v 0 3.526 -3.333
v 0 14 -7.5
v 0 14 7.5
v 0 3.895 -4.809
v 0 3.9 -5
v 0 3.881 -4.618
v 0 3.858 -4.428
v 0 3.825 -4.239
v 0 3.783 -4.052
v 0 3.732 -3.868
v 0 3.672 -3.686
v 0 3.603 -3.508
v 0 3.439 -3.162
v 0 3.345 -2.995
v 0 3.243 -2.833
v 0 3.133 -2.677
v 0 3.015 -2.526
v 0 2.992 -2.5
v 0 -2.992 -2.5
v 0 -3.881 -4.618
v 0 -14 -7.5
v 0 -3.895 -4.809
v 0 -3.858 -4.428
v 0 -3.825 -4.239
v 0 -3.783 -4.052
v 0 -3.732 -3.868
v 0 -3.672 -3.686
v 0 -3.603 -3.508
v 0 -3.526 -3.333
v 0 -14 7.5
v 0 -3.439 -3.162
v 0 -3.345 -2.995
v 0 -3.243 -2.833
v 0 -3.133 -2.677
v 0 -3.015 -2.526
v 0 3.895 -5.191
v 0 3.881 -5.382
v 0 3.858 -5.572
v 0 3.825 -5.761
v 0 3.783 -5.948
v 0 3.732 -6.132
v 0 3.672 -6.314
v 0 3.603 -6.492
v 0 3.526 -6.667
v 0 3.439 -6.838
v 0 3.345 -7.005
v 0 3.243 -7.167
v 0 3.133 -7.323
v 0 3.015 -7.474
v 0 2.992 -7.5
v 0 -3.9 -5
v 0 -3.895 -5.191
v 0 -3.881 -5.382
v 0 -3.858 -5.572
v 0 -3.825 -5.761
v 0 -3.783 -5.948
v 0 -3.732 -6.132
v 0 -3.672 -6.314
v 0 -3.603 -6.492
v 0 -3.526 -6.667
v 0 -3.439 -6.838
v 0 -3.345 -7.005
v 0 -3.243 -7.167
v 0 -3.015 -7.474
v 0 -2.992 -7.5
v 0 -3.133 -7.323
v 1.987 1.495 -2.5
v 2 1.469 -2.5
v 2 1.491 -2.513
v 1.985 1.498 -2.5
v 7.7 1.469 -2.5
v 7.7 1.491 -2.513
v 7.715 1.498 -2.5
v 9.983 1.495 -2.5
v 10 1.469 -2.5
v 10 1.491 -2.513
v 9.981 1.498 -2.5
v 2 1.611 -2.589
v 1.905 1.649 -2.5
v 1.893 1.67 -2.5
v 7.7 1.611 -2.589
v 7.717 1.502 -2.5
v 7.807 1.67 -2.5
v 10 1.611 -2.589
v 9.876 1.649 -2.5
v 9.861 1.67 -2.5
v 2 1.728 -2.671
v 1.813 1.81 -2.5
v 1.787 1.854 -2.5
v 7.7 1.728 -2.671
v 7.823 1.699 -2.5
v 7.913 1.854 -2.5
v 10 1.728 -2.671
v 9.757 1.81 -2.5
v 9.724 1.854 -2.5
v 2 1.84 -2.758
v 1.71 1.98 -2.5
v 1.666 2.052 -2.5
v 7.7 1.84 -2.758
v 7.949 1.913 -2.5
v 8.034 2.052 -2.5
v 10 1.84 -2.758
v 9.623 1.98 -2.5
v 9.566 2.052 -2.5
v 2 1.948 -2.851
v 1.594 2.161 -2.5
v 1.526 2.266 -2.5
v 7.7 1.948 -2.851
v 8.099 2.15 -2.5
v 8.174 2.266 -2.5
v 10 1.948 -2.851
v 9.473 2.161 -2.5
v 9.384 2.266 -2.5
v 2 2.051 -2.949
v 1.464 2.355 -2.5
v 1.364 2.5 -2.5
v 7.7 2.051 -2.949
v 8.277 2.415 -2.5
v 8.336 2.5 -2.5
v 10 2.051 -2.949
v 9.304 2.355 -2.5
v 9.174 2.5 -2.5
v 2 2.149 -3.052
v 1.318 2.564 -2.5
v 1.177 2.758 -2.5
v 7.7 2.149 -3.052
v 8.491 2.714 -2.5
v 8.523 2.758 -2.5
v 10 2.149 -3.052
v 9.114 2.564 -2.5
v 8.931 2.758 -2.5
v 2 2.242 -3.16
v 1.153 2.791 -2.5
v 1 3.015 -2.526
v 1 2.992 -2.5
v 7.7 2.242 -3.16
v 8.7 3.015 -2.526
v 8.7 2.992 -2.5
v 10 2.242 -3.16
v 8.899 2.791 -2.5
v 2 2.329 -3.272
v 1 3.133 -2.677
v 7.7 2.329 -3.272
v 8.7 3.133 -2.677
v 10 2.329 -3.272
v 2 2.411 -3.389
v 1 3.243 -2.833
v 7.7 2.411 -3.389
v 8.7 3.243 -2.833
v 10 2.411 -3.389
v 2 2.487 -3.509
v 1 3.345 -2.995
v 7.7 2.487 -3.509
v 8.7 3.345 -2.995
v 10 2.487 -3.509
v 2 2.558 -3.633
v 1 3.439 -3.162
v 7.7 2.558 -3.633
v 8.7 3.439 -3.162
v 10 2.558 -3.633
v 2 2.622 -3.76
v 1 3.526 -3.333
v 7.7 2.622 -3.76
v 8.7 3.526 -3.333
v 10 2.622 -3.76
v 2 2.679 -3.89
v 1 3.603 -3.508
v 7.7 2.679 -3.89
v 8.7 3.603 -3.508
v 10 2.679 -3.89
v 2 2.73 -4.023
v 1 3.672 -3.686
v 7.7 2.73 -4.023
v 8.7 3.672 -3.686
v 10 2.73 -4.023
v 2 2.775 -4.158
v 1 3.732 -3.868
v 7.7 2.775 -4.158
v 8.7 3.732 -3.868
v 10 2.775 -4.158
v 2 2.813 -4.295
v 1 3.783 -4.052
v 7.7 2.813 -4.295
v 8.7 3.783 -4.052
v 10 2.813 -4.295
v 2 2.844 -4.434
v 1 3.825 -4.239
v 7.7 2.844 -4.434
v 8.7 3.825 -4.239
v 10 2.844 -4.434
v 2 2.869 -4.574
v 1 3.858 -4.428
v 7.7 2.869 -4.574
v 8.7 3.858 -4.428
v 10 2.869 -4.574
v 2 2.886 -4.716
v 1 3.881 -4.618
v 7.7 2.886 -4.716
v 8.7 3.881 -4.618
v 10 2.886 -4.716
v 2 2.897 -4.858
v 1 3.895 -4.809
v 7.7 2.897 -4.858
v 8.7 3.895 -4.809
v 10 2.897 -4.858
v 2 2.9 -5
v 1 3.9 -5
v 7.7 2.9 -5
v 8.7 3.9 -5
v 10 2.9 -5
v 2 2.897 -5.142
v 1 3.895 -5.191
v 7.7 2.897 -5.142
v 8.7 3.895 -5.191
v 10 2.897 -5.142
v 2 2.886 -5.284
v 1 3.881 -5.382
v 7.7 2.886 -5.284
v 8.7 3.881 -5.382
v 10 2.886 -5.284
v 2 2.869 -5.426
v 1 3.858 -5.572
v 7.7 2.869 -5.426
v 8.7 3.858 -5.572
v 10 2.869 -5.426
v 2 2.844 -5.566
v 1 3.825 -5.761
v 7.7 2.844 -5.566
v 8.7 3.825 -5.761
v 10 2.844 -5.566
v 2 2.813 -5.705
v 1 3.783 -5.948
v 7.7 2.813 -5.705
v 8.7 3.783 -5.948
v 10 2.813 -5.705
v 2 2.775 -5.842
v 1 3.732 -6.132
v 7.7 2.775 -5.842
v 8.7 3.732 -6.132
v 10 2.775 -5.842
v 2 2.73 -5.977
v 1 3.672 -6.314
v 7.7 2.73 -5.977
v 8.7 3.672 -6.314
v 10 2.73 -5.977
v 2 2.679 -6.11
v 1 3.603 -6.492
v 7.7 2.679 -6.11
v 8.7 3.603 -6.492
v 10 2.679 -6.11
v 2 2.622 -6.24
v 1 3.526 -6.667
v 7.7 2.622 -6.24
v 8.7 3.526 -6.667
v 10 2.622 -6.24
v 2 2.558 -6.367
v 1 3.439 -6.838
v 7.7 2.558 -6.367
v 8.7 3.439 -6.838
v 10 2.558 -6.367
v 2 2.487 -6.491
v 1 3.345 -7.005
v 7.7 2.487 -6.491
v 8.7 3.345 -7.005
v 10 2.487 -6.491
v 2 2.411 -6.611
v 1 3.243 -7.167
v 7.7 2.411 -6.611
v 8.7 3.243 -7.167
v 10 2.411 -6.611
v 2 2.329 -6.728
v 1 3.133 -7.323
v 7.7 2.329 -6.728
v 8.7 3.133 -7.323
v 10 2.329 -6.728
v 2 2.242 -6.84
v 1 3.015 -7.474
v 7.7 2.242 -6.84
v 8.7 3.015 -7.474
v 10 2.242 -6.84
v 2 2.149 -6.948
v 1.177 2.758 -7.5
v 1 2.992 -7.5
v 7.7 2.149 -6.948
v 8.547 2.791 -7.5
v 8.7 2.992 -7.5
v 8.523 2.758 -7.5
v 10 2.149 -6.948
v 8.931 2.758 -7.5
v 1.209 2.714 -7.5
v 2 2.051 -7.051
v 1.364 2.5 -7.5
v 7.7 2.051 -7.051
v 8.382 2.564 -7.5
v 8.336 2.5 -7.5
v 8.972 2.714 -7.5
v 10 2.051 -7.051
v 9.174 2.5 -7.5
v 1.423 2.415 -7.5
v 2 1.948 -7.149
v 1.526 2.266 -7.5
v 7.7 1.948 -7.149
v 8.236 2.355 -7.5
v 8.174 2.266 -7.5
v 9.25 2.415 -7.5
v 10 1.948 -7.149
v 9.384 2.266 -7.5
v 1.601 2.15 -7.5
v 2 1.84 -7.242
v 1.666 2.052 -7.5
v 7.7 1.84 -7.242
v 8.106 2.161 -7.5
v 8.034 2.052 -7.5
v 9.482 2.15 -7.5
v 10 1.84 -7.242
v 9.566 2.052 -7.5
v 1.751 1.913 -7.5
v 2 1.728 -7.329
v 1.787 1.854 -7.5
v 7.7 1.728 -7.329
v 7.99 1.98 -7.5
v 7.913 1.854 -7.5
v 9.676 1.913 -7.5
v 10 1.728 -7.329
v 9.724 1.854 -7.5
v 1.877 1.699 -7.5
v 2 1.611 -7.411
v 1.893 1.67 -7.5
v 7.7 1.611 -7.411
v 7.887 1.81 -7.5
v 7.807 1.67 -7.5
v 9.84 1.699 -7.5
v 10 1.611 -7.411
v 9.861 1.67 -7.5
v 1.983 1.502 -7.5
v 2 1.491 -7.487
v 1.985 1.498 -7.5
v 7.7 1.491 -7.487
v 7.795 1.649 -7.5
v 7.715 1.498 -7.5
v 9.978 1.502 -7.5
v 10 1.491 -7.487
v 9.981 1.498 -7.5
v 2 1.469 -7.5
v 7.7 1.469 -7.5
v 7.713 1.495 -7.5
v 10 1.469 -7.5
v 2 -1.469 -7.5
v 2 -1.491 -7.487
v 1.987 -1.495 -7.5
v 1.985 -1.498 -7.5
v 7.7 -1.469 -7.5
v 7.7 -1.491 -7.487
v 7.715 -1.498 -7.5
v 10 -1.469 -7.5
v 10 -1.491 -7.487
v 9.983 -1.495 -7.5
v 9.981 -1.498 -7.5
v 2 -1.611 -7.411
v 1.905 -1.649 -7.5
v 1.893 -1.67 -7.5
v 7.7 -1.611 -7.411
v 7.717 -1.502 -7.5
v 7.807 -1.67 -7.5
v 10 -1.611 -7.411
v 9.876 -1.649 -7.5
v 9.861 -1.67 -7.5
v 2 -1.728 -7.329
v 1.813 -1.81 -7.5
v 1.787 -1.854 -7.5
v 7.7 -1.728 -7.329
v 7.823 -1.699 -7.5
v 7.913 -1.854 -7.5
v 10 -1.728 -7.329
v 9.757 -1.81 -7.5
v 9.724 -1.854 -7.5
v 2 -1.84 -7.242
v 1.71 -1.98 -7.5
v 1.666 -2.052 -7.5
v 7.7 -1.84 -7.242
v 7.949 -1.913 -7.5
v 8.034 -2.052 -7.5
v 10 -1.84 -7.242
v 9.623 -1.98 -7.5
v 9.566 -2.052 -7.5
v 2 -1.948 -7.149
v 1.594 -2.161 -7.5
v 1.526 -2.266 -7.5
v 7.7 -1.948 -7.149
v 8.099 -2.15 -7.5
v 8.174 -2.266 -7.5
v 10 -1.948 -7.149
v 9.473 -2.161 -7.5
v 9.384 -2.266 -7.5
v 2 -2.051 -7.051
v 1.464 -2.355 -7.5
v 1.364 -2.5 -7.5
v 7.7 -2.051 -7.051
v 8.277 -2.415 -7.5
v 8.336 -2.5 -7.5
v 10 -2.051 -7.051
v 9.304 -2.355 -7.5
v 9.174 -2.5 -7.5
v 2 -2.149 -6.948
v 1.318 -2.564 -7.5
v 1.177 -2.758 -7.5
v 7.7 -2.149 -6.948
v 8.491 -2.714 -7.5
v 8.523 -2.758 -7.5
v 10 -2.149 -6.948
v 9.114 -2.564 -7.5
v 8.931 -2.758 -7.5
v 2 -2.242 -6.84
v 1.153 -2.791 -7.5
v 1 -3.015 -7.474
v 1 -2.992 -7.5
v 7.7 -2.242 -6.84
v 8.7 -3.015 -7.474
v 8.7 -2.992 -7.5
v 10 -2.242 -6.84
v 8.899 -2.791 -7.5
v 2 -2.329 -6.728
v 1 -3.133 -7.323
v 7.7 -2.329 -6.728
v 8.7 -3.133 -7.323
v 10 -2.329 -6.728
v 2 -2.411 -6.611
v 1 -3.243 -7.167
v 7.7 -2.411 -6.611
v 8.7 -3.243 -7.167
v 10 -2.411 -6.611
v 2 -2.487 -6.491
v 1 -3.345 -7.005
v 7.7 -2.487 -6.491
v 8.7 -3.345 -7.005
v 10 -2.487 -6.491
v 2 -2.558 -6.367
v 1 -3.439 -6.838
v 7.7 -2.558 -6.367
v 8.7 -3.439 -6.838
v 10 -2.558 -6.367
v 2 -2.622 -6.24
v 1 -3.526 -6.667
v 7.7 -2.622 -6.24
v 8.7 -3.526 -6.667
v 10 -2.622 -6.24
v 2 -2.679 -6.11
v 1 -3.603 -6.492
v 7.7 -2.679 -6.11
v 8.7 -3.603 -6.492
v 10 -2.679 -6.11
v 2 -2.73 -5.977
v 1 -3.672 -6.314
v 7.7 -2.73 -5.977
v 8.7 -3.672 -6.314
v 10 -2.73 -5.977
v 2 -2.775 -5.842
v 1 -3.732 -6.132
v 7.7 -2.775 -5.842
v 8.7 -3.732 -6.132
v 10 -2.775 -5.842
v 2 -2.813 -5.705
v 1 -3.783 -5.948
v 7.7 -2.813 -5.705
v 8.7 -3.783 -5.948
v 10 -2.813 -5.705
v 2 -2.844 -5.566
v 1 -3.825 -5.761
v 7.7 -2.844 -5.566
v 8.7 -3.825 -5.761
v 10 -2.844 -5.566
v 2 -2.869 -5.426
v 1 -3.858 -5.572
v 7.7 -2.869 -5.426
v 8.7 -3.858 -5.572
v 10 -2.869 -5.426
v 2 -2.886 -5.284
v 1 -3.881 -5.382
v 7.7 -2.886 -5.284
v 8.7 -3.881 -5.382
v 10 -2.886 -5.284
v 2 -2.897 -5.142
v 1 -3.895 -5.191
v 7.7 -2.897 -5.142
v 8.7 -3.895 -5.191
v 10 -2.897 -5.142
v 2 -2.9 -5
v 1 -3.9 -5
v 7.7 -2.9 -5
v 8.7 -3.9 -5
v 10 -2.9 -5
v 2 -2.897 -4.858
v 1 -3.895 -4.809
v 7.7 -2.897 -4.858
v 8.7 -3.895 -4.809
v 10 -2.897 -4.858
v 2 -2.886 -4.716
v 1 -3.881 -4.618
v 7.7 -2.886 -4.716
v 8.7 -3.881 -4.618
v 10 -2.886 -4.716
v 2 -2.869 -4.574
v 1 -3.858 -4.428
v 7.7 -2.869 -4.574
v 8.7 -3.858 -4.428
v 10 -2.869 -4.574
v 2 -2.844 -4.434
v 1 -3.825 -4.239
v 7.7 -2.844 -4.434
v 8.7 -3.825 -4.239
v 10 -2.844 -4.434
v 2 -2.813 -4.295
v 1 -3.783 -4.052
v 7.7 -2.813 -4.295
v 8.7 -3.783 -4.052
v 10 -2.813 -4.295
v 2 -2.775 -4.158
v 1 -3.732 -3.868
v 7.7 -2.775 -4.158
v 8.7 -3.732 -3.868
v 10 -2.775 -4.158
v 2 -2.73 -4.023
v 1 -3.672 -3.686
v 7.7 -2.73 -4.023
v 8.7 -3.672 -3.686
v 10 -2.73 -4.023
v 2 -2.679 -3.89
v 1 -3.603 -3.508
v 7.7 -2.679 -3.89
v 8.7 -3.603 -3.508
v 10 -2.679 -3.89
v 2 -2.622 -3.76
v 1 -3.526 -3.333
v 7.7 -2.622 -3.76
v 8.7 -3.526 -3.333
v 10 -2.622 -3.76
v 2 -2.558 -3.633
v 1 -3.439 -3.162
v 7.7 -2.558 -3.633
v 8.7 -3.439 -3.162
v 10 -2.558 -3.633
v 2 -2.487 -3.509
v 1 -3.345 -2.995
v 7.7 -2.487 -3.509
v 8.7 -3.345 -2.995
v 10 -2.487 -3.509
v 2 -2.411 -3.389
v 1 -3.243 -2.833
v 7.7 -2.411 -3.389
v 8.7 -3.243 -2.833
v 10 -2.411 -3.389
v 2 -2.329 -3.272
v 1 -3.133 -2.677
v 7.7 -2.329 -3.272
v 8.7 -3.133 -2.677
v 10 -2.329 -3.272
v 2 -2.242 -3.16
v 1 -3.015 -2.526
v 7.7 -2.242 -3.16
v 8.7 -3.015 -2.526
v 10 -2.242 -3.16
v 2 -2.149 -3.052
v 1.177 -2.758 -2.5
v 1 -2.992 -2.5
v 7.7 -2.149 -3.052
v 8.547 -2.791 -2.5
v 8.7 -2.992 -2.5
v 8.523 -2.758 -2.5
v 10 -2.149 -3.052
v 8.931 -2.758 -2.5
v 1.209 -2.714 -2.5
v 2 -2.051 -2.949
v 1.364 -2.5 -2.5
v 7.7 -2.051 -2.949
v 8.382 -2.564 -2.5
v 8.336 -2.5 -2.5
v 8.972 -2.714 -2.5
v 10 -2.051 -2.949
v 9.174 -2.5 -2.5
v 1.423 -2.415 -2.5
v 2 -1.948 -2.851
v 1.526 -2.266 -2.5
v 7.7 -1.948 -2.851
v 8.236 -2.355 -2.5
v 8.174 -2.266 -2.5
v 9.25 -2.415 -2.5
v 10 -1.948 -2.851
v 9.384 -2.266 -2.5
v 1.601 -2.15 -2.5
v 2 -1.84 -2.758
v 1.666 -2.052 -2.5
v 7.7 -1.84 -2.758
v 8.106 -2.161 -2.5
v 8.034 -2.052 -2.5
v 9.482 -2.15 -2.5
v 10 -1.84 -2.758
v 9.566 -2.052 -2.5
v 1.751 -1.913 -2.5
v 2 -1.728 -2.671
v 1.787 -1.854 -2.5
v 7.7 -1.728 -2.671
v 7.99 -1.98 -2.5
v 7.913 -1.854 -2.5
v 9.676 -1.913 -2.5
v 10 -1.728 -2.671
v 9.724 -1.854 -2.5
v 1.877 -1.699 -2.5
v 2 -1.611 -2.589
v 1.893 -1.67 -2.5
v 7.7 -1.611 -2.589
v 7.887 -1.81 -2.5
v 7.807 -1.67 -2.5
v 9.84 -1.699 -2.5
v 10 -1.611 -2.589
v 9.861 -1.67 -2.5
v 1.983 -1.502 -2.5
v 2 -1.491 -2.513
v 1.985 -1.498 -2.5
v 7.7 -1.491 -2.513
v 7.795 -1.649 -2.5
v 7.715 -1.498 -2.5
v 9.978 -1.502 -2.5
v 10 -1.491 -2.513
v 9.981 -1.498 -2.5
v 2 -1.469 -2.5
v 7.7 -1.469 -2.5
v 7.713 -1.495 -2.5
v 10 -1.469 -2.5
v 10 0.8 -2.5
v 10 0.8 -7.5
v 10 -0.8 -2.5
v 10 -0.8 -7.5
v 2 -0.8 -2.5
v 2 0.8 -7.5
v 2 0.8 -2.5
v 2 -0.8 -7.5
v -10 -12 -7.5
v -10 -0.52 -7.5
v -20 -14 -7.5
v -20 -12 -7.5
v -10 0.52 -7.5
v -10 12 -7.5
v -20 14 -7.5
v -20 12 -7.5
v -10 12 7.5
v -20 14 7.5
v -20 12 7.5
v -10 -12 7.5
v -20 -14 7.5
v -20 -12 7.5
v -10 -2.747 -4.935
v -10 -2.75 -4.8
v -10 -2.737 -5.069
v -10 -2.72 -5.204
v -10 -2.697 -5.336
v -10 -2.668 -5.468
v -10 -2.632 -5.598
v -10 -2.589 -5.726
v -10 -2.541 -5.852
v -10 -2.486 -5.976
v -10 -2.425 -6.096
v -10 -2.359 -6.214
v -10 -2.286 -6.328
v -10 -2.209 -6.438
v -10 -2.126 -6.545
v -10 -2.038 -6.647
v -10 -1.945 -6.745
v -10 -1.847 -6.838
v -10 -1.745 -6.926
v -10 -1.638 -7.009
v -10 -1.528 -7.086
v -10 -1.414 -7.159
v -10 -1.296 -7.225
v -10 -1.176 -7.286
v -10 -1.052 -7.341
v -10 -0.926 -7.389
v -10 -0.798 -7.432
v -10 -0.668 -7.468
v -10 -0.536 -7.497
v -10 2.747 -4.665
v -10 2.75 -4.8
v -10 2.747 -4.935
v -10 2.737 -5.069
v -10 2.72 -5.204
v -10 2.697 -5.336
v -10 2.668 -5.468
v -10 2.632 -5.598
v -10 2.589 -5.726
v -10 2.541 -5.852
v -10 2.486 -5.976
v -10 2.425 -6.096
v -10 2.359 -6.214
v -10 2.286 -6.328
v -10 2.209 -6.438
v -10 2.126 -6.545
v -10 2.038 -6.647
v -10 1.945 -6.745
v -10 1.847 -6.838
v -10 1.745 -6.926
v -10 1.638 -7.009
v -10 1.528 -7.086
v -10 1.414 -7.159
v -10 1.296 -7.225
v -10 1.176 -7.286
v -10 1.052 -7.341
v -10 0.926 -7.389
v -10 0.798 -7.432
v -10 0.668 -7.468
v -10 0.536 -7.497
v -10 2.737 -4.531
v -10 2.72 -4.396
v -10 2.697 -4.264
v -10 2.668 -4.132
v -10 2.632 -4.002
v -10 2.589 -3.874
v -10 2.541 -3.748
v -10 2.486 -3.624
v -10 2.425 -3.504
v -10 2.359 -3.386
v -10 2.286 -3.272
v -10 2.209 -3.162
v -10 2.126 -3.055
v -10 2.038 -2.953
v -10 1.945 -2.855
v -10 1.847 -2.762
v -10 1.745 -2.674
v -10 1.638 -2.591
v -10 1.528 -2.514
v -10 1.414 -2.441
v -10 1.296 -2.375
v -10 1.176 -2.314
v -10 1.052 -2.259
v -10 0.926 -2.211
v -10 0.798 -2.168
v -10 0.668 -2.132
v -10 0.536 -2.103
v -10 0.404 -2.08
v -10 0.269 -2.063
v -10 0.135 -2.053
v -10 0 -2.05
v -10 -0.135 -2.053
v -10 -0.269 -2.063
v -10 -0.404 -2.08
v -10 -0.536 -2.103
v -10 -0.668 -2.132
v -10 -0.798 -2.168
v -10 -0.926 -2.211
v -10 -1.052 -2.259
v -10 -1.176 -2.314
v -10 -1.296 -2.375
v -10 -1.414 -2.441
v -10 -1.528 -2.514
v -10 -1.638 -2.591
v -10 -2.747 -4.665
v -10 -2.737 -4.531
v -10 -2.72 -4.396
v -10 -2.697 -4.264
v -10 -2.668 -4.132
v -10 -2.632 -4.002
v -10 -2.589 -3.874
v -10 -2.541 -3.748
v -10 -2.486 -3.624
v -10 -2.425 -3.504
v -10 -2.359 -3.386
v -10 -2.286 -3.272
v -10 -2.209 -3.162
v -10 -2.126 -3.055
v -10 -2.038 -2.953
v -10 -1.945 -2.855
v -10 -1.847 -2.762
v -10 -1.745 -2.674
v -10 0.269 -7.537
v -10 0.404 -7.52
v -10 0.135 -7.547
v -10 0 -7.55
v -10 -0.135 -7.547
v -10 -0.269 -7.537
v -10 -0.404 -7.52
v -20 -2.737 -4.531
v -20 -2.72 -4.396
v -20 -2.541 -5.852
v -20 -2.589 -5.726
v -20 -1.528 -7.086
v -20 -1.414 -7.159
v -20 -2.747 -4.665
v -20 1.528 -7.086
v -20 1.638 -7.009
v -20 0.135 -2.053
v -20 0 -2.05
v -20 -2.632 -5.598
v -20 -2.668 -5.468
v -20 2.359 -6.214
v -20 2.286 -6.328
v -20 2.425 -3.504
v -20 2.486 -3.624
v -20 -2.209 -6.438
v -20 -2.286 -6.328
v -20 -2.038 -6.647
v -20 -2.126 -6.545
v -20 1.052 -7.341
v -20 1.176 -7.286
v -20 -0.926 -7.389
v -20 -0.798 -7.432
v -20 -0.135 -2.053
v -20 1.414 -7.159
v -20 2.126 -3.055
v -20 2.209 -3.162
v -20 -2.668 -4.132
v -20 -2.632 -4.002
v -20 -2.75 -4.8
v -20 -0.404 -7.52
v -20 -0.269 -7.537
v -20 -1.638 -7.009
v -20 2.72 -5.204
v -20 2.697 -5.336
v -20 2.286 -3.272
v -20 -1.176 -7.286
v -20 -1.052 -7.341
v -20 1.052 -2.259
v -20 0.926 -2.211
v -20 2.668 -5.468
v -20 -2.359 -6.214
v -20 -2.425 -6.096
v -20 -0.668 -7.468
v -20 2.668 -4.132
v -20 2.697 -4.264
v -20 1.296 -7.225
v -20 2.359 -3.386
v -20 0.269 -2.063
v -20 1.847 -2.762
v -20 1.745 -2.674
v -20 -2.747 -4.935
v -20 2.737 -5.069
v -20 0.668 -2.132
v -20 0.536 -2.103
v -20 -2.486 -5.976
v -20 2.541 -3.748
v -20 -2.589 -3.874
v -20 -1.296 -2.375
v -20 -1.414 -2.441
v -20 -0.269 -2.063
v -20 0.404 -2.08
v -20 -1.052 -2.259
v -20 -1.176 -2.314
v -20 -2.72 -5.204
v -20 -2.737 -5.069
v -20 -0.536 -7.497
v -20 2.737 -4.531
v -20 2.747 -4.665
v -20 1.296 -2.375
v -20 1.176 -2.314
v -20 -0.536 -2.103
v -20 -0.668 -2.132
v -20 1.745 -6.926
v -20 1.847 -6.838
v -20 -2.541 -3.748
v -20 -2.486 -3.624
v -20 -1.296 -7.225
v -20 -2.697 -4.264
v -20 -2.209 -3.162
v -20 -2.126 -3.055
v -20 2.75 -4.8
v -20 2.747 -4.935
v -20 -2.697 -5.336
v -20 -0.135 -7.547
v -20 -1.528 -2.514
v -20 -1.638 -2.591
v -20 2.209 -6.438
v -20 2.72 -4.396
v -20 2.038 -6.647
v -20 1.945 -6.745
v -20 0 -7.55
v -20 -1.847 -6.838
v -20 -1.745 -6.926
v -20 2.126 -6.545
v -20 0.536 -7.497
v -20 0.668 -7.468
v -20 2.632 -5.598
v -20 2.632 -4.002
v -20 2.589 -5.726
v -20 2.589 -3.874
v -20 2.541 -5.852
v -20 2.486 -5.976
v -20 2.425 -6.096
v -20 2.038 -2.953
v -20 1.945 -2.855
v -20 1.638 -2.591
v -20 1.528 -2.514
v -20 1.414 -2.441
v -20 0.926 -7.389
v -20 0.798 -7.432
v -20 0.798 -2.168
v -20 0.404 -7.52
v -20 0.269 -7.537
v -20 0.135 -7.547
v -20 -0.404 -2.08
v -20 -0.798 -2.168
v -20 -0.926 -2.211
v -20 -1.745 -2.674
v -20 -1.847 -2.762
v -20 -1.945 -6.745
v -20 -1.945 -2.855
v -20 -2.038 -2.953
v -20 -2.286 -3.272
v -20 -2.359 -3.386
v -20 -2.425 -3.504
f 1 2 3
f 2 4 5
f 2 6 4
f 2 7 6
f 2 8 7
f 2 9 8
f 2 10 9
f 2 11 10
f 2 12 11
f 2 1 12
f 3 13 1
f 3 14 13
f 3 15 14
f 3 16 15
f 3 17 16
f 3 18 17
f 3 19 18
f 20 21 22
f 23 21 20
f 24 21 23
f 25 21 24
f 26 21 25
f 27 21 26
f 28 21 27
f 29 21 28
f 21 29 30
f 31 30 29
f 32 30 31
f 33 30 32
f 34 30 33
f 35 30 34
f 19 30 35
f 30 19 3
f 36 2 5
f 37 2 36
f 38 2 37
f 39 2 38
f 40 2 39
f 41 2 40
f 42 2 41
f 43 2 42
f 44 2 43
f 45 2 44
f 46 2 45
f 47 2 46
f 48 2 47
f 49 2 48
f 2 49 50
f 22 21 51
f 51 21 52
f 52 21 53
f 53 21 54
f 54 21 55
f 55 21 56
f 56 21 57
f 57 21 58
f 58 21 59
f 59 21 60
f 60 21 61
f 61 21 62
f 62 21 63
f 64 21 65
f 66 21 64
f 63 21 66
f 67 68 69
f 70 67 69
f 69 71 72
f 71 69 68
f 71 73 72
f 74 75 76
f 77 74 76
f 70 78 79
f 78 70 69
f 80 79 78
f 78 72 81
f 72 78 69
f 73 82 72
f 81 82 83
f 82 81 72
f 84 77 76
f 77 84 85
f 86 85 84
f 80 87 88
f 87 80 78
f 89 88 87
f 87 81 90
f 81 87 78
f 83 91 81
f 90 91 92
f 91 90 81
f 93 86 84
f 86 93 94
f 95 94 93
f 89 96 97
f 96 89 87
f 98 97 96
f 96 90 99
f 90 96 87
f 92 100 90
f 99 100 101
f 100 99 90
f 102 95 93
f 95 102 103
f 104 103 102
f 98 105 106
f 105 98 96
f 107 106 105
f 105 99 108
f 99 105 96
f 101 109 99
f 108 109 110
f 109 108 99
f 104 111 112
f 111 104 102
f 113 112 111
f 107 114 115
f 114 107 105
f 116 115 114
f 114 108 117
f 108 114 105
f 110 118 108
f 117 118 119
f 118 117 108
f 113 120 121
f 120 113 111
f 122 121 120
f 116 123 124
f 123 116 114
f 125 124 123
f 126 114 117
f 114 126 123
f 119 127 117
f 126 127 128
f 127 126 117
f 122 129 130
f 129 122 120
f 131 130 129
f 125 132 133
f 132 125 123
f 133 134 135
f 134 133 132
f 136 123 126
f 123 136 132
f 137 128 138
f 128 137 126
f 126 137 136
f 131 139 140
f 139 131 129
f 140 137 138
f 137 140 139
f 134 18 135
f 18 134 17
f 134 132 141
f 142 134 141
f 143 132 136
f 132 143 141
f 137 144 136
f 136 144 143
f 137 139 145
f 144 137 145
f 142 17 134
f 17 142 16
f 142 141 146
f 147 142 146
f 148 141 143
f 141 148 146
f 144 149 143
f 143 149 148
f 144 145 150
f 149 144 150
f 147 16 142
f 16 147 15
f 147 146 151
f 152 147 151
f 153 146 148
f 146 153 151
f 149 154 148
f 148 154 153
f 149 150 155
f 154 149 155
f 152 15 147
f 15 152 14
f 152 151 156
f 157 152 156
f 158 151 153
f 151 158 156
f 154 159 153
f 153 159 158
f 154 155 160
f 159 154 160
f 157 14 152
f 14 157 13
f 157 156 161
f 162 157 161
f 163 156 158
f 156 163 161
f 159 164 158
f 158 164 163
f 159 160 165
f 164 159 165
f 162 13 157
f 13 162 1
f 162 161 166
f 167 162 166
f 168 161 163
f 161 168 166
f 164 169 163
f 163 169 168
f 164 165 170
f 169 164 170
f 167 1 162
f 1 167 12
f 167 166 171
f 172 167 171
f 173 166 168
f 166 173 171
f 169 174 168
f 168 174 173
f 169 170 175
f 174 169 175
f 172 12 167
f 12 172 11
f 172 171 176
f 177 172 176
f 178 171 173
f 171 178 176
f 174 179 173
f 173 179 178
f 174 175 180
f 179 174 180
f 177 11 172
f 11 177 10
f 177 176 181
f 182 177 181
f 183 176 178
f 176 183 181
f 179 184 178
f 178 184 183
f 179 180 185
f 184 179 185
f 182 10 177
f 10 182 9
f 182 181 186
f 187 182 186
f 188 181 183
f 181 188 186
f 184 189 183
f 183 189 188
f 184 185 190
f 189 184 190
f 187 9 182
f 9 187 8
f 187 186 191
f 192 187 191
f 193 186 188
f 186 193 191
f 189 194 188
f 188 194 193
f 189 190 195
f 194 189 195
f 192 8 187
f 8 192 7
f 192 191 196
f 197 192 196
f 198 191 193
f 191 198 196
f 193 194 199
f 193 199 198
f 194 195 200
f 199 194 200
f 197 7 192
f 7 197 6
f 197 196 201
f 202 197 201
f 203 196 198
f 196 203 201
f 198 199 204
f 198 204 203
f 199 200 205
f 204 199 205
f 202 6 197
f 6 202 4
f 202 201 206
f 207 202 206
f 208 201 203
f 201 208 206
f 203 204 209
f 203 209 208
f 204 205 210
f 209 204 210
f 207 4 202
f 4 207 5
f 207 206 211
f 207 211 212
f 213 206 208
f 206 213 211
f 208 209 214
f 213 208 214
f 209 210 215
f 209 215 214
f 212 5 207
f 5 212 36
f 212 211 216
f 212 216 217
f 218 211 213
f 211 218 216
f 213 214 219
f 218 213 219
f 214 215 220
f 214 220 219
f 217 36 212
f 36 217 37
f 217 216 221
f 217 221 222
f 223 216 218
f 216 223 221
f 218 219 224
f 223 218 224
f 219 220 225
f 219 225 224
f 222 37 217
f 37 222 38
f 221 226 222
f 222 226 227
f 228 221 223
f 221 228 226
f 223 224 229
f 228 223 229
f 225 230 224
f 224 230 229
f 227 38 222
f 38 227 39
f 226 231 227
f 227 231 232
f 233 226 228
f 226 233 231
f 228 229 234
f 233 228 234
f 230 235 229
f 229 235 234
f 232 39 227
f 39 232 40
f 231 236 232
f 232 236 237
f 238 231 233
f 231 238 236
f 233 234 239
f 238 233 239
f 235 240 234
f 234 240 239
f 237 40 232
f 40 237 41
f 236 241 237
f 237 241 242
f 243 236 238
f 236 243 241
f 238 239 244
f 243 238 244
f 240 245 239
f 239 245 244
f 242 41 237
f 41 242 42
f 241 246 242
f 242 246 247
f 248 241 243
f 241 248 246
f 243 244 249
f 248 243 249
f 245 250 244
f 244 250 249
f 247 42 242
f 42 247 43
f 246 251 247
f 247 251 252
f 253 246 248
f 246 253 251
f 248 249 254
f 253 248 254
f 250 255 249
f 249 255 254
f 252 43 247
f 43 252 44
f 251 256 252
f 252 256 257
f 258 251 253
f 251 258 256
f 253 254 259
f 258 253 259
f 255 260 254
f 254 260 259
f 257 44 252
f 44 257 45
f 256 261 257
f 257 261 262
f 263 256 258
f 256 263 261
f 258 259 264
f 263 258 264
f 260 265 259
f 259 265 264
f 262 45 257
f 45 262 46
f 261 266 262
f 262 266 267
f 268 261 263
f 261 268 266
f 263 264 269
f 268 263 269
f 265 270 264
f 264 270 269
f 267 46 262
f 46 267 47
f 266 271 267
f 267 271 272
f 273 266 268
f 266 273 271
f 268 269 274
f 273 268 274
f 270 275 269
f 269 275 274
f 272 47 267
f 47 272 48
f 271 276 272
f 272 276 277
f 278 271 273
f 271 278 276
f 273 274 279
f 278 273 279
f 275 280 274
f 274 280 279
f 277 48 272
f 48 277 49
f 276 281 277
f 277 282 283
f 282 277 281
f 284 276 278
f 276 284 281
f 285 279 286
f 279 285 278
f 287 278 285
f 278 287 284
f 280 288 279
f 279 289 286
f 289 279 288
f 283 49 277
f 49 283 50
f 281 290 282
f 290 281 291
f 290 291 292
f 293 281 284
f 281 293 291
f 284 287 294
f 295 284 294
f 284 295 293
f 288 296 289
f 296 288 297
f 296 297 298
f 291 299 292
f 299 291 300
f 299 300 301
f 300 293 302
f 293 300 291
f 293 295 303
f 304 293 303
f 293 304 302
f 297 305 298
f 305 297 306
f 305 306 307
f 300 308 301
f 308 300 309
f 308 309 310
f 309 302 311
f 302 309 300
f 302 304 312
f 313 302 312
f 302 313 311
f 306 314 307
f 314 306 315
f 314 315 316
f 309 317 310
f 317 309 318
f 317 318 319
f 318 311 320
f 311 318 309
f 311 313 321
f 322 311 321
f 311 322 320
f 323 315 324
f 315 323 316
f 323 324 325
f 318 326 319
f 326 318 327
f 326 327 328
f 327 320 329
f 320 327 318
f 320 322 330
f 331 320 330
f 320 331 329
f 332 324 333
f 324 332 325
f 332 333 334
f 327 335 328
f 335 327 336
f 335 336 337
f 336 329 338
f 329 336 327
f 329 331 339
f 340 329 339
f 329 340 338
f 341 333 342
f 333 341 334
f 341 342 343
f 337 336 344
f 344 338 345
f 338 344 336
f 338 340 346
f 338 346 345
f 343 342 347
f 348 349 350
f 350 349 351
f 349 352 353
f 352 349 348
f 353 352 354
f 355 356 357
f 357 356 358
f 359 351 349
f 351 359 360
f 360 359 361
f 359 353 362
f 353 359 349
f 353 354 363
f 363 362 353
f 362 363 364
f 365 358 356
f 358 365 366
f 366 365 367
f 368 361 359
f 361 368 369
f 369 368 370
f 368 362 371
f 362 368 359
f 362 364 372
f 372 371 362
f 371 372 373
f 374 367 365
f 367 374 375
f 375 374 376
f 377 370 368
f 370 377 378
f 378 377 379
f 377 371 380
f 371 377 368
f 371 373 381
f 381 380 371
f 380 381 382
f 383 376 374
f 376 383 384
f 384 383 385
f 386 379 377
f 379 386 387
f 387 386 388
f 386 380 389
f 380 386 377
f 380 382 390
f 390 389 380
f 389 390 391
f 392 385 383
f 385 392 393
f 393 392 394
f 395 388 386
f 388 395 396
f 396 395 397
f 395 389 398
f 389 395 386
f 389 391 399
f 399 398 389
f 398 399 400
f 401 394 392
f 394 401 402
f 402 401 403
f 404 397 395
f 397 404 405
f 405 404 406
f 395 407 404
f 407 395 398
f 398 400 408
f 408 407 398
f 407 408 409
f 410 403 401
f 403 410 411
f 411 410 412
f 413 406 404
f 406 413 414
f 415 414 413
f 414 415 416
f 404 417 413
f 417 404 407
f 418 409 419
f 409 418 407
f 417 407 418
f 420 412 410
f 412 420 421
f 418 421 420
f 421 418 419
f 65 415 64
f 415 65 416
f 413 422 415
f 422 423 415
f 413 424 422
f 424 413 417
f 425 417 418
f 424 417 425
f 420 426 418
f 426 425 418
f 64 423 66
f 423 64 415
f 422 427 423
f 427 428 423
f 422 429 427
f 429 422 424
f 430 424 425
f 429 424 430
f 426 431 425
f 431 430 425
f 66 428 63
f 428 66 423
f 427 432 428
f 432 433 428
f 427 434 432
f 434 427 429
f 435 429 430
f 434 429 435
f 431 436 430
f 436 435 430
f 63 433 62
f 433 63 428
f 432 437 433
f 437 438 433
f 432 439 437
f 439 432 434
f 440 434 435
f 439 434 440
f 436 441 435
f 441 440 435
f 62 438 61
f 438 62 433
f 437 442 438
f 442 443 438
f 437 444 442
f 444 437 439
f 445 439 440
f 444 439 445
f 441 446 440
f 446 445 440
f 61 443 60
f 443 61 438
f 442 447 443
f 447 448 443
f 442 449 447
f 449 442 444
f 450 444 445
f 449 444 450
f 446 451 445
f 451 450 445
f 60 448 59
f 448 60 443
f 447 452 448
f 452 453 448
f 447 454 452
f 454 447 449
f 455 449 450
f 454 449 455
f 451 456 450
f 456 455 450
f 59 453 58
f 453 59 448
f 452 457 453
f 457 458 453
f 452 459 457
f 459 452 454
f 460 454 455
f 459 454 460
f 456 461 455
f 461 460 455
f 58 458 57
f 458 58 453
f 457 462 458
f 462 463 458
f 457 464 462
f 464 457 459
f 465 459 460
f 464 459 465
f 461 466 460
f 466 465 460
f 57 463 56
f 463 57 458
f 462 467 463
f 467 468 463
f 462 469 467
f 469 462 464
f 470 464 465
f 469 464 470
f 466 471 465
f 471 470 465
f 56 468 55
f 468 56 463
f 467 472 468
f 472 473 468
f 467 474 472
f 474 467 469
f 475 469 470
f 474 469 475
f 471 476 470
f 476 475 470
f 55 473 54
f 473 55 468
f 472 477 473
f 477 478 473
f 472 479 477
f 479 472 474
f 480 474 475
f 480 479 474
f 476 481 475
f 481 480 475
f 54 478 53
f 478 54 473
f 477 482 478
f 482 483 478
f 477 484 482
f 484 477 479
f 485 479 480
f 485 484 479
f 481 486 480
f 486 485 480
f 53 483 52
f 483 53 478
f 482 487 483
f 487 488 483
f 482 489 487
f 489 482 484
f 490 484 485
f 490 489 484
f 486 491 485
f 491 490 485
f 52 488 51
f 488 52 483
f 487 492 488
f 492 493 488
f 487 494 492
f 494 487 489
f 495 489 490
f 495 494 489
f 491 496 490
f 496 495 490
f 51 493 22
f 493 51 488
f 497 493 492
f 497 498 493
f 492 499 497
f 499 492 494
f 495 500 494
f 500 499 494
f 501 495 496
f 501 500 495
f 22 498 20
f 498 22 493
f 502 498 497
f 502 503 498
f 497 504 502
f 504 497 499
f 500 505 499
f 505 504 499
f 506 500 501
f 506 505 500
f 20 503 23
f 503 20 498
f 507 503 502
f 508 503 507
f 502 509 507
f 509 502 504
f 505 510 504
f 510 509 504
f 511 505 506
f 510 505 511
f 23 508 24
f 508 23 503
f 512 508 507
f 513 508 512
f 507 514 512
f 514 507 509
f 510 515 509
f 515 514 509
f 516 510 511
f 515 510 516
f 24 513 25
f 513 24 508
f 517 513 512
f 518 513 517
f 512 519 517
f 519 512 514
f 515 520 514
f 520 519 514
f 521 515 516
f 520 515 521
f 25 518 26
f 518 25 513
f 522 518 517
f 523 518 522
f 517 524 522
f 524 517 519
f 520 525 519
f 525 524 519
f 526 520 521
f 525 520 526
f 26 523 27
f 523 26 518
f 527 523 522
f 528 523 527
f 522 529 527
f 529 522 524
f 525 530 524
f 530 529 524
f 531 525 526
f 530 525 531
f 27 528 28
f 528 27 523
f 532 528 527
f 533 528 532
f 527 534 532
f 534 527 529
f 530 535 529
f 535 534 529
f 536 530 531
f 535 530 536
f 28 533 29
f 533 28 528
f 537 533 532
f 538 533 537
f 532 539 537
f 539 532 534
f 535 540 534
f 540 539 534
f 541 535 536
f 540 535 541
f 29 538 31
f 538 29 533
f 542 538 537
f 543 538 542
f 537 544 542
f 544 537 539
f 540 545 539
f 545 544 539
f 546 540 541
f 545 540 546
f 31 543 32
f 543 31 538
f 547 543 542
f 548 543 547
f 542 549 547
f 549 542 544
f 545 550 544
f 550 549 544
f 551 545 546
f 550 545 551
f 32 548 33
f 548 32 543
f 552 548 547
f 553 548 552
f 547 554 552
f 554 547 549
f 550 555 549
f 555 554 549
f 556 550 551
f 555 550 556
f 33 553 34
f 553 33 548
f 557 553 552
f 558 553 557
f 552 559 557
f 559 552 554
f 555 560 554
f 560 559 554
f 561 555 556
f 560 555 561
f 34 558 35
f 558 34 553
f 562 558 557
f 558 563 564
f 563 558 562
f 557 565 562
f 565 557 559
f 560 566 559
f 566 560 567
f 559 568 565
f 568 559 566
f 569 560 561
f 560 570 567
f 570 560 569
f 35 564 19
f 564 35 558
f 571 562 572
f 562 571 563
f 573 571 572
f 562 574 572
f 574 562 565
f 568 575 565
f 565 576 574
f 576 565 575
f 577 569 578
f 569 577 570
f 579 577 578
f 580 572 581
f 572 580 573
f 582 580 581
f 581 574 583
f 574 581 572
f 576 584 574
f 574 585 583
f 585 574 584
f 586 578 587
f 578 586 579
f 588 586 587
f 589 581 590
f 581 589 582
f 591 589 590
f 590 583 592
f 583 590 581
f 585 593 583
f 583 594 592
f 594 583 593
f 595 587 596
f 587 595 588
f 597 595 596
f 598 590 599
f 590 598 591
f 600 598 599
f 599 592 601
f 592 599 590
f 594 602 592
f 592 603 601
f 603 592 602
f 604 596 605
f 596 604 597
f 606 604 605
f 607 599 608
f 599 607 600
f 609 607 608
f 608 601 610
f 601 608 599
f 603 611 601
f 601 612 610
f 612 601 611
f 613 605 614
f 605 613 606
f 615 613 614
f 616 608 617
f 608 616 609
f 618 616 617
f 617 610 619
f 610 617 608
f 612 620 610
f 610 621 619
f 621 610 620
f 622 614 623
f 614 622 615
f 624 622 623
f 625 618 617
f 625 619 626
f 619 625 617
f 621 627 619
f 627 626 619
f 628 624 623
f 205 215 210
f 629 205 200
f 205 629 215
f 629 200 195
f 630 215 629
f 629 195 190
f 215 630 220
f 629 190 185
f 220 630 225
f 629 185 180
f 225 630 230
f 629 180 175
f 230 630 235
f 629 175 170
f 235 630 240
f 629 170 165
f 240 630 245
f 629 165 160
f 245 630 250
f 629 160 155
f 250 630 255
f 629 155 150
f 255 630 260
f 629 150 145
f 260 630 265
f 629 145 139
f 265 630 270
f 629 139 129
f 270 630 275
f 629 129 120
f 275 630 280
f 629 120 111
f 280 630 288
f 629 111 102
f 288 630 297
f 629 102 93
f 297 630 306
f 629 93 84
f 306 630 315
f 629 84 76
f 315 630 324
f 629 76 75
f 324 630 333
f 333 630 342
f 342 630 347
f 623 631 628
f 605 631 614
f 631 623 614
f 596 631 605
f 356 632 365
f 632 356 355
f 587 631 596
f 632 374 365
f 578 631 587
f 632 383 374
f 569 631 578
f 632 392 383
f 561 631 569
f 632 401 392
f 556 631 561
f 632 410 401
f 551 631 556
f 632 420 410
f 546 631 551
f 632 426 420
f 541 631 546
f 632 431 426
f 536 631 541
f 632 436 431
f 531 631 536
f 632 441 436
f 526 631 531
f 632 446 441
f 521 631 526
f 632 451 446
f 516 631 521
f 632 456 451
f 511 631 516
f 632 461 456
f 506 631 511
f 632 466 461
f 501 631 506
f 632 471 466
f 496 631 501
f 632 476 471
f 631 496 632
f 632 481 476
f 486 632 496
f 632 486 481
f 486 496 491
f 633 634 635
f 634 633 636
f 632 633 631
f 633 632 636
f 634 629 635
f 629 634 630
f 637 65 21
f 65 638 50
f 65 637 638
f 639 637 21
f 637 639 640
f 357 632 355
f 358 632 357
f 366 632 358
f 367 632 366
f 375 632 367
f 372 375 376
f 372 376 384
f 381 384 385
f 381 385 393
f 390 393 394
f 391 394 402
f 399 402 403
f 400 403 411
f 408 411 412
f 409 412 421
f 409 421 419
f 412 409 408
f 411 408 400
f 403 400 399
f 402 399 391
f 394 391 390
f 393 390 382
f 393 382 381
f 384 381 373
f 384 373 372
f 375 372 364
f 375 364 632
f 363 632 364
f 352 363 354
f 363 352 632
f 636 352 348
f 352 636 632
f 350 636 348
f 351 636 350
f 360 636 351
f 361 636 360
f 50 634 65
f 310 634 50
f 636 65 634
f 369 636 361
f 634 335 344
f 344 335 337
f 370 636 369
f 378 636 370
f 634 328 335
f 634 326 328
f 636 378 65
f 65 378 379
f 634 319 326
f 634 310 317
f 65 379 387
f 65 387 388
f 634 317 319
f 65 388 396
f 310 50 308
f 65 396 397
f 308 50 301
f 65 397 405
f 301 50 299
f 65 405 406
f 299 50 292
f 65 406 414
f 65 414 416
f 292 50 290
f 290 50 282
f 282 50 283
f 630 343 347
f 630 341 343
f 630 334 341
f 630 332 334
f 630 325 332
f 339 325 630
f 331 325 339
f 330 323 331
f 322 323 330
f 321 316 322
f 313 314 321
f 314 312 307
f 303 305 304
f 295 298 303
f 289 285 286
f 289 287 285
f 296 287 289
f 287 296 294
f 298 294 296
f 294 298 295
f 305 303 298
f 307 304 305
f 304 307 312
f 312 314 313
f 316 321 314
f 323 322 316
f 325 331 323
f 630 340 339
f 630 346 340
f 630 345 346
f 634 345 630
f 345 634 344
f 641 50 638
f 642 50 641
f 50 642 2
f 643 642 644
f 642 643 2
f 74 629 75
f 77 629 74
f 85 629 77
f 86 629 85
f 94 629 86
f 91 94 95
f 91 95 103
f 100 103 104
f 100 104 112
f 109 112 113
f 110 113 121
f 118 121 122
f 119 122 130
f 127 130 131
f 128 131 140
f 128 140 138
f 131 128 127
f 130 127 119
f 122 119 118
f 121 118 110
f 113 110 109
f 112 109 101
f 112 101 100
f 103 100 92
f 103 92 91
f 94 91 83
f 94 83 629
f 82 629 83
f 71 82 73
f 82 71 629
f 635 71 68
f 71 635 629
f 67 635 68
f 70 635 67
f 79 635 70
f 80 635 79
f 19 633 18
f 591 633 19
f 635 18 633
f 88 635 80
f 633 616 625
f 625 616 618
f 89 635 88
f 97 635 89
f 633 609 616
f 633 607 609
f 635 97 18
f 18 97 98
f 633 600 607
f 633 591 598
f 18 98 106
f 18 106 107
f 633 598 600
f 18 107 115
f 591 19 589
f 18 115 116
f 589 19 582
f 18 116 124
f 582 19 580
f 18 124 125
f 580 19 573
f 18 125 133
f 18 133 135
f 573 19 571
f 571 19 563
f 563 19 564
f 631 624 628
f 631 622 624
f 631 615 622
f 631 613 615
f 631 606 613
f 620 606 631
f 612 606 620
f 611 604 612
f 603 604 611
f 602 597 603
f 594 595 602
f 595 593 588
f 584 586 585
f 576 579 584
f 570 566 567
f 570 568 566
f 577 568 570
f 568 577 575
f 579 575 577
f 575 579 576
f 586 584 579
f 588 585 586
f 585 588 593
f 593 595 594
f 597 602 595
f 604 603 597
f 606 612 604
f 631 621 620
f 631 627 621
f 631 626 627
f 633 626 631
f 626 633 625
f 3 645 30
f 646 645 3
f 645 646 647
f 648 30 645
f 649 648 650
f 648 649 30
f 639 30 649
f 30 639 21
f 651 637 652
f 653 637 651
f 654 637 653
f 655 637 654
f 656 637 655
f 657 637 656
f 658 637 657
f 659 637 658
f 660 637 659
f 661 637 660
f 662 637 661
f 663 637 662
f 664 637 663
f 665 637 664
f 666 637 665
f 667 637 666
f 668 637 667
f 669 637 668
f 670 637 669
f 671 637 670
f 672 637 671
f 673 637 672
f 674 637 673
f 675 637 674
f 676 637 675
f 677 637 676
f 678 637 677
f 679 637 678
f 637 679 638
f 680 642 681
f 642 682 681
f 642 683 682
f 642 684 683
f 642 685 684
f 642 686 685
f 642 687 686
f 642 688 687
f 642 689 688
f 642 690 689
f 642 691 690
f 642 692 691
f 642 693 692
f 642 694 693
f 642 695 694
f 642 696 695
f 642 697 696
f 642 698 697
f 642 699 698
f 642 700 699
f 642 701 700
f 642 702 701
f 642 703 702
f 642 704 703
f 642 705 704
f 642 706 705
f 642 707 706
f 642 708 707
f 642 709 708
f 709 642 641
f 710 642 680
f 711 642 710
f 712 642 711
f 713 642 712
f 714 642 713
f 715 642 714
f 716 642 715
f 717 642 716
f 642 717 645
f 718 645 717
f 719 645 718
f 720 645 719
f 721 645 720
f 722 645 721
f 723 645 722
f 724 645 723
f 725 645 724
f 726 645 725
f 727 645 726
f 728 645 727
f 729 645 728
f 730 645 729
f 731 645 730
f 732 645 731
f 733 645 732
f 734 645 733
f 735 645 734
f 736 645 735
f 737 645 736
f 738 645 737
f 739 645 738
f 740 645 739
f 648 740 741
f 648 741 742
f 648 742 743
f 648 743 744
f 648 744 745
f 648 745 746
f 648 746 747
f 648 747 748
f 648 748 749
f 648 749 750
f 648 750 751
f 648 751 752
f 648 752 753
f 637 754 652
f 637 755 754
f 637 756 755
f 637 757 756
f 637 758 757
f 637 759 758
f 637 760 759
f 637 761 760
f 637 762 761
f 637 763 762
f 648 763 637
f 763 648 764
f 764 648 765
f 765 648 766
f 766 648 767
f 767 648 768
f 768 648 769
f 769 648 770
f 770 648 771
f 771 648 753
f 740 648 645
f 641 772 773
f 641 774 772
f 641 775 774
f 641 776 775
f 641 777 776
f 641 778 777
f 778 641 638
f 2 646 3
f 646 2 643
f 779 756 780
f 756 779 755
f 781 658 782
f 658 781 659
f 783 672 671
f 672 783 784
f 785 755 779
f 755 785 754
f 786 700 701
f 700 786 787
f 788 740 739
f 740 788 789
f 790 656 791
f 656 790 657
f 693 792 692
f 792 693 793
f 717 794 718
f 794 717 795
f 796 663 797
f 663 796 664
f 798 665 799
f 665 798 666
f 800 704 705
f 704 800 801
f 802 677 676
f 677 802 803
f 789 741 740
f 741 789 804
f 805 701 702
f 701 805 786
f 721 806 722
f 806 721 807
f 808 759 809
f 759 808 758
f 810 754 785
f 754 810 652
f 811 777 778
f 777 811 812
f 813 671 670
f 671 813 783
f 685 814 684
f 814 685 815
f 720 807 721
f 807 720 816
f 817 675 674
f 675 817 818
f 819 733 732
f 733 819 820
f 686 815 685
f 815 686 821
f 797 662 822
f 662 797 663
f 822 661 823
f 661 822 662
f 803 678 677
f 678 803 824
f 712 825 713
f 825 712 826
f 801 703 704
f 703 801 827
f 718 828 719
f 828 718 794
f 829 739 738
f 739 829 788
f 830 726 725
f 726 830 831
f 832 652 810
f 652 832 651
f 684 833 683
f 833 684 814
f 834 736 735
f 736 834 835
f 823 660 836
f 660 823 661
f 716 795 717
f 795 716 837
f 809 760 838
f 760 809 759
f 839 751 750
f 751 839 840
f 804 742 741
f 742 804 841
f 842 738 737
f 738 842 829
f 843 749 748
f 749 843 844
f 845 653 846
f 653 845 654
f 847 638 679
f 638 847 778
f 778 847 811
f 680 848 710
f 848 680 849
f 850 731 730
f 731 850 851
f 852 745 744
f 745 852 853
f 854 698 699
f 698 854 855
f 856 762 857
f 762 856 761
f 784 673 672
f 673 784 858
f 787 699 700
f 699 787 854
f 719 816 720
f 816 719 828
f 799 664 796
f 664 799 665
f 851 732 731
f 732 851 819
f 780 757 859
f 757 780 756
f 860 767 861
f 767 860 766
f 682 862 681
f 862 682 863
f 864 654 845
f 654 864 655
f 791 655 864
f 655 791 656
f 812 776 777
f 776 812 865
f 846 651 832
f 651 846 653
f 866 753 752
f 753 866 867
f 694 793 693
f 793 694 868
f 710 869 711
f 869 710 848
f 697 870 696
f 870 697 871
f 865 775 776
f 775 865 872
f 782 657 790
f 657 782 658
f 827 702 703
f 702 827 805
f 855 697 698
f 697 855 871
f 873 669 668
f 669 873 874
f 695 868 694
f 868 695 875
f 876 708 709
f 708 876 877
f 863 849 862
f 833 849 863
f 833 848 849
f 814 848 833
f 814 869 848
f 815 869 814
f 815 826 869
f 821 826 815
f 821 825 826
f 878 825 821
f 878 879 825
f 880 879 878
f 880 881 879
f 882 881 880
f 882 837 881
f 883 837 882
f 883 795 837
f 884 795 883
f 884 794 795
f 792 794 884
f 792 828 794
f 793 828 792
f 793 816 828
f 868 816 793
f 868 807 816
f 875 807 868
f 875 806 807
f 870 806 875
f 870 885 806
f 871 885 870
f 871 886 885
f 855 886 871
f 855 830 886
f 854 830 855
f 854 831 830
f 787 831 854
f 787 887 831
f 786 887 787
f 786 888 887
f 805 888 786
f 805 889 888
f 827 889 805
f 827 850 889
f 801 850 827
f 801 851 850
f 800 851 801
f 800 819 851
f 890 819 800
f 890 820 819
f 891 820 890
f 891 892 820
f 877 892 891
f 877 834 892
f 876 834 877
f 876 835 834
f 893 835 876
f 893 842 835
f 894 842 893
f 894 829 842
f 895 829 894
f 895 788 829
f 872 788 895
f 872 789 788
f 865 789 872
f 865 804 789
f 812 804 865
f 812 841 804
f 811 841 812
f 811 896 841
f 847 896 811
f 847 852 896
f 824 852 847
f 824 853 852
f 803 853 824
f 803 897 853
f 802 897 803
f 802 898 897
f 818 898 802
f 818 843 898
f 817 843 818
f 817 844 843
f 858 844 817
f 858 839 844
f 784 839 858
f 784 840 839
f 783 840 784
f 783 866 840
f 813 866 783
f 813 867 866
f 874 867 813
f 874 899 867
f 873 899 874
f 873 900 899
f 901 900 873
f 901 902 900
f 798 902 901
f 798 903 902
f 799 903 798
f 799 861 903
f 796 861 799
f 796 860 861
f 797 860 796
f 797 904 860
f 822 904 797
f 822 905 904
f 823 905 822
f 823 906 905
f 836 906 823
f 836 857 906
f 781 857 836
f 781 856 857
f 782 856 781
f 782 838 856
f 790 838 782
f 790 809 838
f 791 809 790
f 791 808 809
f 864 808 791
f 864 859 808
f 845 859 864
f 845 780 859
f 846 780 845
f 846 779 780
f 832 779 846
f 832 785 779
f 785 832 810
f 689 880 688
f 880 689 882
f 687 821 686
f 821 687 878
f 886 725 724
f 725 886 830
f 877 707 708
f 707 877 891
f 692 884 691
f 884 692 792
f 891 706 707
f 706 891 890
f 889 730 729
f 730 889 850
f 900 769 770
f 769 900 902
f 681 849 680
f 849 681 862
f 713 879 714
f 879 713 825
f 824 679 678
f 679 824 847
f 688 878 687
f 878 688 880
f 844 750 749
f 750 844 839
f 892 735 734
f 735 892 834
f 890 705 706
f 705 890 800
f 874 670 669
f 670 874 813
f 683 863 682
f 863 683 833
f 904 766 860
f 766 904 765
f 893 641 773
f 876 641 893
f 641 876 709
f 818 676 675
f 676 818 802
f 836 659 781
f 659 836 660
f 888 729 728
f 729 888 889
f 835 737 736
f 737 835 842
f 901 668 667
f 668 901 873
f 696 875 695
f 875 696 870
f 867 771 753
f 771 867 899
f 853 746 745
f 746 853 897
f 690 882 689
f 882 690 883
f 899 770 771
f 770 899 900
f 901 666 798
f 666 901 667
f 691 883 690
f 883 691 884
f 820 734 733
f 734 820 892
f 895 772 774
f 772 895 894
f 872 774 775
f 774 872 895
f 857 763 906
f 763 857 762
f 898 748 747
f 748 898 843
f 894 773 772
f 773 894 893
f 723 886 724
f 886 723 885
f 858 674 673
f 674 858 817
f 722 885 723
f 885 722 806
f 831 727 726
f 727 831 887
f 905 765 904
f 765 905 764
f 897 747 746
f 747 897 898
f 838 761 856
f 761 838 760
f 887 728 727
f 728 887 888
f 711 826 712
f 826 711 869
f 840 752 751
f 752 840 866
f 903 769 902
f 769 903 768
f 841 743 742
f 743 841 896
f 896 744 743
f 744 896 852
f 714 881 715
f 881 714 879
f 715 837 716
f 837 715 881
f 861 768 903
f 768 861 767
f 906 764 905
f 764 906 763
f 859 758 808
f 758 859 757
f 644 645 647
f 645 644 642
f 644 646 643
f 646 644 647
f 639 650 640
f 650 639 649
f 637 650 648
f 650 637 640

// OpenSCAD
rotate([0.0, -90.0, 0.0])
{
    union()
    {
        rotate([0.0, 90.0, 0.0])
        {
            translate([0.0, 0.0, -5.0])
            {
                rotate([0.0, 90.0, 0.0])
                {
                    intersection()
                    {
                        difference()
                        {
                            rotate_extrude(angle = 360.0, $fn = 128)
                            {
                                M66();
                            }
                            translate([0.0, 0.0, 2.0])
                            {
                                linear_extrude(height = 10.0, twist = 0.0, scale = 1.0, slices = 1, center = false)
                                {
                                    scale([10.0, 1.6])
                                    {
                                        M8();
                                    }
                                }
                            }
                        }
                        linear_extrude(height = 10.0, twist = 0.0, scale = 1.0, slices = 1, center = false)
                        {
                            scale([5.0, 10.0])
                            {
                                M8();
                            }
                        }
                    }
                }
            }
        }
        translate([0.0, 0.0, 0.0])
        {
            linear_extrude(height = 10.0, twist = 0.0, scale = 1.0, slices = 1, center = false)
            {
                scale([15.0, 28.0])
                {
                    M8();
                }
            }
        }
        translate([-4.8, 0.0, 10.0])
        {
            translate([0.0, 0.0, 5.0])
            {
                linear_extrude(height = 10.0, twist = 0.0, scale = 1.0, slices = 1, center = true)
                {
                    scale([5.5, 5.5])
                    {
                        M211();
                    }
                }
            }
        }
        translate([0.0, 13.0, 10.0])
        {
            linear_extrude(height = 10.0, twist = 0.0, scale = 1.0, slices = 1, center = false)
            {
                scale([15.0, 2.0])
                {
                    M8();
                }
            }
        }
        translate([0.0, -13.0, 10.0])
        {
            linear_extrude(height = 10.0, twist = 0.0, scale = 1.0, slices = 1, center = false)
            {
                scale([15.0, 2.0])
                {
                    M8();
                }
            }
        }
    }
}

module M66()
{
    polygon
    (
        points =
        [
            [0.0, 0.0], 
            [3.9, 0.0], 
            [3.9, 1.0], 
            [2.9, 2.0], 
            [2.9, 7.7], 
            [3.9, 8.7], 
            [2.9, 10.0], 
            [0.0, 10.0], 
            [0.0, 2.0]
        ],
        paths =
        [
            [0, 1, 2, 3, 4, 5, 6, 7, 8]
        ]
    );
}

module M211()
{
    polygon
    (
        points =
        [
            [0.5, 0.0], 
            [0.4993977281025862, 0.024533837163709007], 
            [0.49759236333609846, 0.0490085701647803], 
            [0.4945882549823905, 0.07336523722768087], 
            [0.4903926402016152, 0.09754516100806412], 
            [0.485015626597272, 0.12149008995163194], 
            [0.4784701678661044, 0.14514233862723117], 
            [0.4707720325915104, 0.16844492669611003], 
            [0.46193976625564337, 0.1913417161825449], 
            [0.45199464656172167, 0.21377754671514104], 
            [0.4409606321741775, 0.23569836841299882], 
            [0.42886430500013606, 0.25705137209661083], 
            [0.4157348061512726, 0.2777851165098011], 
            [0.40160376574032247, 0.2978496522462167], 
            [0.3865052266813685, 0.31719664208182274], 
            [0.37047556267747955, 0.33577947742350917], 
            [0.3535533905932738, 0.35355339059327373], 
            [0.33577947742350917, 0.37047556267747955], 
            [0.31719664208182274, 0.3865052266813685], 
            [0.29784965224621673, 0.4016037657403224], 
            [0.27778511650980114, 0.4157348061512726], 
            [0.25705137209661083, 0.42886430500013606], 
            [0.2356983684129989, 0.44096063217417747], 
            [0.2137775467151411, 0.45199464656172167], 
            [0.19134171618254492, 0.46193976625564337], 
            [0.16844492669611003, 0.4707720325915104], 
            [0.14514233862723117, 0.47847016786610447], 
            [0.12149008995163199, 0.485015626597272], 
            [0.09754516100806417, 0.4903926402016152], 
            [0.07336523722768087, 0.4945882549823905], 
            [0.049008570164780385, 0.4975923633360984], 
            [0.024533837163709063, 0.4993977281025862], 
            [3.061616997868383E-17, 0.5], 
            [-0.024533837163709004, 0.4993977281025862], 
            [-0.04900857016478032, 0.49759236333609846], 
            [-0.07336523722768082, 0.4945882549823905], 
            [-0.0975451610080641, 0.4903926402016152], 
            [-0.12149008995163194, 0.485015626597272], 
            [-0.14514233862723108, 0.47847016786610447], 
            [-0.16844492669610997, 0.4707720325915104], 
            [-0.19134171618254486, 0.46193976625564337], 
            [-0.21377754671514093, 0.4519946465617217], 
            [-0.23569836841299885, 0.4409606321741775], 
            [-0.25705137209661083, 0.42886430500013606], 
            [-0.277785116509801, 0.41573480615127273], 
            [-0.2978496522462167, 0.40160376574032247], 
            [-0.3171966420818227, 0.38650522668136855], 
            [-0.3357794774235092, 0.3704755626774795], 
            [-0.35355339059327373, 0.3535533905932738], 
            [-0.37047556267747944, 0.3357794774235093], 
            [-0.3865052266813685, 0.31719664208182274], 
            [-0.4016037657403224, 0.29784965224621673], 
            [-0.4157348061512727, 0.2777851165098011], 
            [-0.428864305000136, 0.2570513720966109], 
            [-0.44096063217417747, 0.23569836841299893], 
            [-0.45199464656172167, 0.21377754671514101], 
            [-0.46193976625564337, 0.19134171618254495], 
            [-0.47077203259151035, 0.16844492669611016], 
            [-0.4784701678661044, 0.1451423386272312], 
            [-0.485015626597272, 0.12149008995163203], 
            [-0.4903926402016152, 0.0975451610080643], 
            [-0.4945882549823905, 0.0733652372276809], 
            [-0.4975923633360984, 0.04900857016478041], 
            [-0.4993977281025862, 0.024533837163708983], 
            [-0.5, 6.123233995736766E-17], 
            [-0.4993977281025862, -0.024533837163708862], 
            [-0.49759236333609846, -0.049008570164780295], 
            [-0.4945882549823905, -0.07336523722768079], 
            [-0.4903926402016152, -0.09754516100806418], 
            [-0.485015626597272, -0.12149008995163191], 
            [-0.47847016786610447, -0.14514233862723105], 
            [-0.4707720325915104, -0.16844492669611005], 
            [-0.4619397662556434, -0.19134171618254484], 
            [-0.4519946465617217, -0.2137775467151409], 
            [-0.4409606321741775, -0.23569836841299882], 
            [-0.42886430500013606, -0.2570513720966108], 
            [-0.41573480615127273, -0.277785116509801], 
            [-0.40160376574032247, -0.2978496522462166], 
            [-0.38650522668136855, -0.31719664208182263], 
            [-0.37047556267747955, -0.3357794774235092], 
            [-0.35355339059327384, -0.35355339059327373], 
            [-0.33577947742350933, -0.37047556267747944], 
            [-0.31719664208182297, -0.38650522668136833], 
            [-0.29784965224621657, -0.4016037657403225], 
            [-0.2777851165098011, -0.4157348061512726], 
            [-0.2570513720966109, -0.428864305000136], 
            [-0.23569836841299893, -0.44096063217417747], 
            [-0.21377754671514124, -0.45199464656172156], 
            [-0.19134171618254517, -0.46193976625564326], 
            [-0.16844492669610997, -0.4707720325915104], 
            [-0.14514233862723122, -0.4784701678661044], 
            [-0.12149008995163206, -0.485015626597272], 
            [-0.09754516100806433, -0.49039264020161516], 
            [-0.07336523722768115, -0.49458825498239045], 
            [-0.049008570164780225, -0.49759236333609846], 
            [-0.024533837163709014, -0.4993977281025862], 
            [-9.184850993605148E-17, -0.5], 
            [0.02453383716370883, -0.4993977281025862], 
            [0.049008570164780045, -0.49759236333609846], 
            [0.07336523722768097, -0.49458825498239045], 
            [0.09754516100806415, -0.4903926402016152], 
            [0.12149008995163188, -0.485015626597272], 
            [0.14514233862723103, -0.47847016786610447], 
            [0.1684449266961098, -0.47077203259151046], 
            [0.191341716182545, -0.4619397662556433], 
            [0.21377754671514107, -0.45199464656172167], 
            [0.2356983684129988, -0.4409606321741775], 
            [0.2570513720966108, -0.4288643050001361], 
            [0.2777851165098009, -0.41573480615127273], 
            [0.29784965224621646, -0.40160376574032264], 
            [0.3171966420818228, -0.38650522668136844], 
            [0.33577947742350917, -0.37047556267747955], 
            [0.3535533905932737, -0.35355339059327384], 
            [0.37047556267747944, -0.33577947742350933], 
            [0.38650522668136833, -0.31719664208182297], 
            [0.4016037657403225, -0.2978496522462166], 
            [0.4157348061512726, -0.2777851165098011], 
            [0.428864305000136, -0.25705137209661094], 
            [0.4409606321741774, -0.23569836841299896], 
            [0.45199464656172156, -0.21377754671514126], 
            [0.46193976625564326, -0.1913417161825452], 
            [0.4707720325915104, -0.16844492669611], 
            [0.4784701678661044, -0.14514233862723125], 
            [0.485015626597272, -0.12149008995163209], 
            [0.49039264020161516, -0.09754516100806436], 
            [0.49458825498239045, -0.0733652372276812], 
            [0.49759236333609846, -0.04900857016478025], 
            [0.4993977281025862, -0.024533837163709046]
        ],
        paths =
        [
            [0, 1, 2, 3, 4, 5, 6, 7, 8, 9, 10, 11, 12, 13, 14, 15, 16, 17, 18, 19, 20, 21, 22, 23, 24, 25, 26, 27, 28, 29, 30, 31, 32, 33, 34, 35, 36, 37, 38, 39, 40, 41, 42, 43, 44, 45, 46, 47, 48, 49, 50, 51, 52, 53, 54, 55, 56, 57, 58, 59, 60, 61, 62, 63, 64, 65, 66, 67, 68, 69, 70, 71, 72, 73, 74, 75, 76, 77, 78, 79, 80, 81, 82, 83, 84, 85, 86, 87, 88, 89, 90, 91, 92, 93, 94, 95, 96, 97, 98, 99, 100, 101, 102, 103, 104, 105, 106, 107, 108, 109, 110, 111, 112, 113, 114, 115, 116, 117, 118, 119, 120, 121, 122, 123, 124, 125, 126, 127]
        ]
    );
}

module M8()
{
    polygon
    (
        points =
        [
            [-0.5, -0.5], 
            [0.5, -0.5], 
            [0.5, 0.5], 
            [-0.5, 0.5]
        ],
        paths =
        [
            [0, 1, 2, 3]
        ]
    );
}
